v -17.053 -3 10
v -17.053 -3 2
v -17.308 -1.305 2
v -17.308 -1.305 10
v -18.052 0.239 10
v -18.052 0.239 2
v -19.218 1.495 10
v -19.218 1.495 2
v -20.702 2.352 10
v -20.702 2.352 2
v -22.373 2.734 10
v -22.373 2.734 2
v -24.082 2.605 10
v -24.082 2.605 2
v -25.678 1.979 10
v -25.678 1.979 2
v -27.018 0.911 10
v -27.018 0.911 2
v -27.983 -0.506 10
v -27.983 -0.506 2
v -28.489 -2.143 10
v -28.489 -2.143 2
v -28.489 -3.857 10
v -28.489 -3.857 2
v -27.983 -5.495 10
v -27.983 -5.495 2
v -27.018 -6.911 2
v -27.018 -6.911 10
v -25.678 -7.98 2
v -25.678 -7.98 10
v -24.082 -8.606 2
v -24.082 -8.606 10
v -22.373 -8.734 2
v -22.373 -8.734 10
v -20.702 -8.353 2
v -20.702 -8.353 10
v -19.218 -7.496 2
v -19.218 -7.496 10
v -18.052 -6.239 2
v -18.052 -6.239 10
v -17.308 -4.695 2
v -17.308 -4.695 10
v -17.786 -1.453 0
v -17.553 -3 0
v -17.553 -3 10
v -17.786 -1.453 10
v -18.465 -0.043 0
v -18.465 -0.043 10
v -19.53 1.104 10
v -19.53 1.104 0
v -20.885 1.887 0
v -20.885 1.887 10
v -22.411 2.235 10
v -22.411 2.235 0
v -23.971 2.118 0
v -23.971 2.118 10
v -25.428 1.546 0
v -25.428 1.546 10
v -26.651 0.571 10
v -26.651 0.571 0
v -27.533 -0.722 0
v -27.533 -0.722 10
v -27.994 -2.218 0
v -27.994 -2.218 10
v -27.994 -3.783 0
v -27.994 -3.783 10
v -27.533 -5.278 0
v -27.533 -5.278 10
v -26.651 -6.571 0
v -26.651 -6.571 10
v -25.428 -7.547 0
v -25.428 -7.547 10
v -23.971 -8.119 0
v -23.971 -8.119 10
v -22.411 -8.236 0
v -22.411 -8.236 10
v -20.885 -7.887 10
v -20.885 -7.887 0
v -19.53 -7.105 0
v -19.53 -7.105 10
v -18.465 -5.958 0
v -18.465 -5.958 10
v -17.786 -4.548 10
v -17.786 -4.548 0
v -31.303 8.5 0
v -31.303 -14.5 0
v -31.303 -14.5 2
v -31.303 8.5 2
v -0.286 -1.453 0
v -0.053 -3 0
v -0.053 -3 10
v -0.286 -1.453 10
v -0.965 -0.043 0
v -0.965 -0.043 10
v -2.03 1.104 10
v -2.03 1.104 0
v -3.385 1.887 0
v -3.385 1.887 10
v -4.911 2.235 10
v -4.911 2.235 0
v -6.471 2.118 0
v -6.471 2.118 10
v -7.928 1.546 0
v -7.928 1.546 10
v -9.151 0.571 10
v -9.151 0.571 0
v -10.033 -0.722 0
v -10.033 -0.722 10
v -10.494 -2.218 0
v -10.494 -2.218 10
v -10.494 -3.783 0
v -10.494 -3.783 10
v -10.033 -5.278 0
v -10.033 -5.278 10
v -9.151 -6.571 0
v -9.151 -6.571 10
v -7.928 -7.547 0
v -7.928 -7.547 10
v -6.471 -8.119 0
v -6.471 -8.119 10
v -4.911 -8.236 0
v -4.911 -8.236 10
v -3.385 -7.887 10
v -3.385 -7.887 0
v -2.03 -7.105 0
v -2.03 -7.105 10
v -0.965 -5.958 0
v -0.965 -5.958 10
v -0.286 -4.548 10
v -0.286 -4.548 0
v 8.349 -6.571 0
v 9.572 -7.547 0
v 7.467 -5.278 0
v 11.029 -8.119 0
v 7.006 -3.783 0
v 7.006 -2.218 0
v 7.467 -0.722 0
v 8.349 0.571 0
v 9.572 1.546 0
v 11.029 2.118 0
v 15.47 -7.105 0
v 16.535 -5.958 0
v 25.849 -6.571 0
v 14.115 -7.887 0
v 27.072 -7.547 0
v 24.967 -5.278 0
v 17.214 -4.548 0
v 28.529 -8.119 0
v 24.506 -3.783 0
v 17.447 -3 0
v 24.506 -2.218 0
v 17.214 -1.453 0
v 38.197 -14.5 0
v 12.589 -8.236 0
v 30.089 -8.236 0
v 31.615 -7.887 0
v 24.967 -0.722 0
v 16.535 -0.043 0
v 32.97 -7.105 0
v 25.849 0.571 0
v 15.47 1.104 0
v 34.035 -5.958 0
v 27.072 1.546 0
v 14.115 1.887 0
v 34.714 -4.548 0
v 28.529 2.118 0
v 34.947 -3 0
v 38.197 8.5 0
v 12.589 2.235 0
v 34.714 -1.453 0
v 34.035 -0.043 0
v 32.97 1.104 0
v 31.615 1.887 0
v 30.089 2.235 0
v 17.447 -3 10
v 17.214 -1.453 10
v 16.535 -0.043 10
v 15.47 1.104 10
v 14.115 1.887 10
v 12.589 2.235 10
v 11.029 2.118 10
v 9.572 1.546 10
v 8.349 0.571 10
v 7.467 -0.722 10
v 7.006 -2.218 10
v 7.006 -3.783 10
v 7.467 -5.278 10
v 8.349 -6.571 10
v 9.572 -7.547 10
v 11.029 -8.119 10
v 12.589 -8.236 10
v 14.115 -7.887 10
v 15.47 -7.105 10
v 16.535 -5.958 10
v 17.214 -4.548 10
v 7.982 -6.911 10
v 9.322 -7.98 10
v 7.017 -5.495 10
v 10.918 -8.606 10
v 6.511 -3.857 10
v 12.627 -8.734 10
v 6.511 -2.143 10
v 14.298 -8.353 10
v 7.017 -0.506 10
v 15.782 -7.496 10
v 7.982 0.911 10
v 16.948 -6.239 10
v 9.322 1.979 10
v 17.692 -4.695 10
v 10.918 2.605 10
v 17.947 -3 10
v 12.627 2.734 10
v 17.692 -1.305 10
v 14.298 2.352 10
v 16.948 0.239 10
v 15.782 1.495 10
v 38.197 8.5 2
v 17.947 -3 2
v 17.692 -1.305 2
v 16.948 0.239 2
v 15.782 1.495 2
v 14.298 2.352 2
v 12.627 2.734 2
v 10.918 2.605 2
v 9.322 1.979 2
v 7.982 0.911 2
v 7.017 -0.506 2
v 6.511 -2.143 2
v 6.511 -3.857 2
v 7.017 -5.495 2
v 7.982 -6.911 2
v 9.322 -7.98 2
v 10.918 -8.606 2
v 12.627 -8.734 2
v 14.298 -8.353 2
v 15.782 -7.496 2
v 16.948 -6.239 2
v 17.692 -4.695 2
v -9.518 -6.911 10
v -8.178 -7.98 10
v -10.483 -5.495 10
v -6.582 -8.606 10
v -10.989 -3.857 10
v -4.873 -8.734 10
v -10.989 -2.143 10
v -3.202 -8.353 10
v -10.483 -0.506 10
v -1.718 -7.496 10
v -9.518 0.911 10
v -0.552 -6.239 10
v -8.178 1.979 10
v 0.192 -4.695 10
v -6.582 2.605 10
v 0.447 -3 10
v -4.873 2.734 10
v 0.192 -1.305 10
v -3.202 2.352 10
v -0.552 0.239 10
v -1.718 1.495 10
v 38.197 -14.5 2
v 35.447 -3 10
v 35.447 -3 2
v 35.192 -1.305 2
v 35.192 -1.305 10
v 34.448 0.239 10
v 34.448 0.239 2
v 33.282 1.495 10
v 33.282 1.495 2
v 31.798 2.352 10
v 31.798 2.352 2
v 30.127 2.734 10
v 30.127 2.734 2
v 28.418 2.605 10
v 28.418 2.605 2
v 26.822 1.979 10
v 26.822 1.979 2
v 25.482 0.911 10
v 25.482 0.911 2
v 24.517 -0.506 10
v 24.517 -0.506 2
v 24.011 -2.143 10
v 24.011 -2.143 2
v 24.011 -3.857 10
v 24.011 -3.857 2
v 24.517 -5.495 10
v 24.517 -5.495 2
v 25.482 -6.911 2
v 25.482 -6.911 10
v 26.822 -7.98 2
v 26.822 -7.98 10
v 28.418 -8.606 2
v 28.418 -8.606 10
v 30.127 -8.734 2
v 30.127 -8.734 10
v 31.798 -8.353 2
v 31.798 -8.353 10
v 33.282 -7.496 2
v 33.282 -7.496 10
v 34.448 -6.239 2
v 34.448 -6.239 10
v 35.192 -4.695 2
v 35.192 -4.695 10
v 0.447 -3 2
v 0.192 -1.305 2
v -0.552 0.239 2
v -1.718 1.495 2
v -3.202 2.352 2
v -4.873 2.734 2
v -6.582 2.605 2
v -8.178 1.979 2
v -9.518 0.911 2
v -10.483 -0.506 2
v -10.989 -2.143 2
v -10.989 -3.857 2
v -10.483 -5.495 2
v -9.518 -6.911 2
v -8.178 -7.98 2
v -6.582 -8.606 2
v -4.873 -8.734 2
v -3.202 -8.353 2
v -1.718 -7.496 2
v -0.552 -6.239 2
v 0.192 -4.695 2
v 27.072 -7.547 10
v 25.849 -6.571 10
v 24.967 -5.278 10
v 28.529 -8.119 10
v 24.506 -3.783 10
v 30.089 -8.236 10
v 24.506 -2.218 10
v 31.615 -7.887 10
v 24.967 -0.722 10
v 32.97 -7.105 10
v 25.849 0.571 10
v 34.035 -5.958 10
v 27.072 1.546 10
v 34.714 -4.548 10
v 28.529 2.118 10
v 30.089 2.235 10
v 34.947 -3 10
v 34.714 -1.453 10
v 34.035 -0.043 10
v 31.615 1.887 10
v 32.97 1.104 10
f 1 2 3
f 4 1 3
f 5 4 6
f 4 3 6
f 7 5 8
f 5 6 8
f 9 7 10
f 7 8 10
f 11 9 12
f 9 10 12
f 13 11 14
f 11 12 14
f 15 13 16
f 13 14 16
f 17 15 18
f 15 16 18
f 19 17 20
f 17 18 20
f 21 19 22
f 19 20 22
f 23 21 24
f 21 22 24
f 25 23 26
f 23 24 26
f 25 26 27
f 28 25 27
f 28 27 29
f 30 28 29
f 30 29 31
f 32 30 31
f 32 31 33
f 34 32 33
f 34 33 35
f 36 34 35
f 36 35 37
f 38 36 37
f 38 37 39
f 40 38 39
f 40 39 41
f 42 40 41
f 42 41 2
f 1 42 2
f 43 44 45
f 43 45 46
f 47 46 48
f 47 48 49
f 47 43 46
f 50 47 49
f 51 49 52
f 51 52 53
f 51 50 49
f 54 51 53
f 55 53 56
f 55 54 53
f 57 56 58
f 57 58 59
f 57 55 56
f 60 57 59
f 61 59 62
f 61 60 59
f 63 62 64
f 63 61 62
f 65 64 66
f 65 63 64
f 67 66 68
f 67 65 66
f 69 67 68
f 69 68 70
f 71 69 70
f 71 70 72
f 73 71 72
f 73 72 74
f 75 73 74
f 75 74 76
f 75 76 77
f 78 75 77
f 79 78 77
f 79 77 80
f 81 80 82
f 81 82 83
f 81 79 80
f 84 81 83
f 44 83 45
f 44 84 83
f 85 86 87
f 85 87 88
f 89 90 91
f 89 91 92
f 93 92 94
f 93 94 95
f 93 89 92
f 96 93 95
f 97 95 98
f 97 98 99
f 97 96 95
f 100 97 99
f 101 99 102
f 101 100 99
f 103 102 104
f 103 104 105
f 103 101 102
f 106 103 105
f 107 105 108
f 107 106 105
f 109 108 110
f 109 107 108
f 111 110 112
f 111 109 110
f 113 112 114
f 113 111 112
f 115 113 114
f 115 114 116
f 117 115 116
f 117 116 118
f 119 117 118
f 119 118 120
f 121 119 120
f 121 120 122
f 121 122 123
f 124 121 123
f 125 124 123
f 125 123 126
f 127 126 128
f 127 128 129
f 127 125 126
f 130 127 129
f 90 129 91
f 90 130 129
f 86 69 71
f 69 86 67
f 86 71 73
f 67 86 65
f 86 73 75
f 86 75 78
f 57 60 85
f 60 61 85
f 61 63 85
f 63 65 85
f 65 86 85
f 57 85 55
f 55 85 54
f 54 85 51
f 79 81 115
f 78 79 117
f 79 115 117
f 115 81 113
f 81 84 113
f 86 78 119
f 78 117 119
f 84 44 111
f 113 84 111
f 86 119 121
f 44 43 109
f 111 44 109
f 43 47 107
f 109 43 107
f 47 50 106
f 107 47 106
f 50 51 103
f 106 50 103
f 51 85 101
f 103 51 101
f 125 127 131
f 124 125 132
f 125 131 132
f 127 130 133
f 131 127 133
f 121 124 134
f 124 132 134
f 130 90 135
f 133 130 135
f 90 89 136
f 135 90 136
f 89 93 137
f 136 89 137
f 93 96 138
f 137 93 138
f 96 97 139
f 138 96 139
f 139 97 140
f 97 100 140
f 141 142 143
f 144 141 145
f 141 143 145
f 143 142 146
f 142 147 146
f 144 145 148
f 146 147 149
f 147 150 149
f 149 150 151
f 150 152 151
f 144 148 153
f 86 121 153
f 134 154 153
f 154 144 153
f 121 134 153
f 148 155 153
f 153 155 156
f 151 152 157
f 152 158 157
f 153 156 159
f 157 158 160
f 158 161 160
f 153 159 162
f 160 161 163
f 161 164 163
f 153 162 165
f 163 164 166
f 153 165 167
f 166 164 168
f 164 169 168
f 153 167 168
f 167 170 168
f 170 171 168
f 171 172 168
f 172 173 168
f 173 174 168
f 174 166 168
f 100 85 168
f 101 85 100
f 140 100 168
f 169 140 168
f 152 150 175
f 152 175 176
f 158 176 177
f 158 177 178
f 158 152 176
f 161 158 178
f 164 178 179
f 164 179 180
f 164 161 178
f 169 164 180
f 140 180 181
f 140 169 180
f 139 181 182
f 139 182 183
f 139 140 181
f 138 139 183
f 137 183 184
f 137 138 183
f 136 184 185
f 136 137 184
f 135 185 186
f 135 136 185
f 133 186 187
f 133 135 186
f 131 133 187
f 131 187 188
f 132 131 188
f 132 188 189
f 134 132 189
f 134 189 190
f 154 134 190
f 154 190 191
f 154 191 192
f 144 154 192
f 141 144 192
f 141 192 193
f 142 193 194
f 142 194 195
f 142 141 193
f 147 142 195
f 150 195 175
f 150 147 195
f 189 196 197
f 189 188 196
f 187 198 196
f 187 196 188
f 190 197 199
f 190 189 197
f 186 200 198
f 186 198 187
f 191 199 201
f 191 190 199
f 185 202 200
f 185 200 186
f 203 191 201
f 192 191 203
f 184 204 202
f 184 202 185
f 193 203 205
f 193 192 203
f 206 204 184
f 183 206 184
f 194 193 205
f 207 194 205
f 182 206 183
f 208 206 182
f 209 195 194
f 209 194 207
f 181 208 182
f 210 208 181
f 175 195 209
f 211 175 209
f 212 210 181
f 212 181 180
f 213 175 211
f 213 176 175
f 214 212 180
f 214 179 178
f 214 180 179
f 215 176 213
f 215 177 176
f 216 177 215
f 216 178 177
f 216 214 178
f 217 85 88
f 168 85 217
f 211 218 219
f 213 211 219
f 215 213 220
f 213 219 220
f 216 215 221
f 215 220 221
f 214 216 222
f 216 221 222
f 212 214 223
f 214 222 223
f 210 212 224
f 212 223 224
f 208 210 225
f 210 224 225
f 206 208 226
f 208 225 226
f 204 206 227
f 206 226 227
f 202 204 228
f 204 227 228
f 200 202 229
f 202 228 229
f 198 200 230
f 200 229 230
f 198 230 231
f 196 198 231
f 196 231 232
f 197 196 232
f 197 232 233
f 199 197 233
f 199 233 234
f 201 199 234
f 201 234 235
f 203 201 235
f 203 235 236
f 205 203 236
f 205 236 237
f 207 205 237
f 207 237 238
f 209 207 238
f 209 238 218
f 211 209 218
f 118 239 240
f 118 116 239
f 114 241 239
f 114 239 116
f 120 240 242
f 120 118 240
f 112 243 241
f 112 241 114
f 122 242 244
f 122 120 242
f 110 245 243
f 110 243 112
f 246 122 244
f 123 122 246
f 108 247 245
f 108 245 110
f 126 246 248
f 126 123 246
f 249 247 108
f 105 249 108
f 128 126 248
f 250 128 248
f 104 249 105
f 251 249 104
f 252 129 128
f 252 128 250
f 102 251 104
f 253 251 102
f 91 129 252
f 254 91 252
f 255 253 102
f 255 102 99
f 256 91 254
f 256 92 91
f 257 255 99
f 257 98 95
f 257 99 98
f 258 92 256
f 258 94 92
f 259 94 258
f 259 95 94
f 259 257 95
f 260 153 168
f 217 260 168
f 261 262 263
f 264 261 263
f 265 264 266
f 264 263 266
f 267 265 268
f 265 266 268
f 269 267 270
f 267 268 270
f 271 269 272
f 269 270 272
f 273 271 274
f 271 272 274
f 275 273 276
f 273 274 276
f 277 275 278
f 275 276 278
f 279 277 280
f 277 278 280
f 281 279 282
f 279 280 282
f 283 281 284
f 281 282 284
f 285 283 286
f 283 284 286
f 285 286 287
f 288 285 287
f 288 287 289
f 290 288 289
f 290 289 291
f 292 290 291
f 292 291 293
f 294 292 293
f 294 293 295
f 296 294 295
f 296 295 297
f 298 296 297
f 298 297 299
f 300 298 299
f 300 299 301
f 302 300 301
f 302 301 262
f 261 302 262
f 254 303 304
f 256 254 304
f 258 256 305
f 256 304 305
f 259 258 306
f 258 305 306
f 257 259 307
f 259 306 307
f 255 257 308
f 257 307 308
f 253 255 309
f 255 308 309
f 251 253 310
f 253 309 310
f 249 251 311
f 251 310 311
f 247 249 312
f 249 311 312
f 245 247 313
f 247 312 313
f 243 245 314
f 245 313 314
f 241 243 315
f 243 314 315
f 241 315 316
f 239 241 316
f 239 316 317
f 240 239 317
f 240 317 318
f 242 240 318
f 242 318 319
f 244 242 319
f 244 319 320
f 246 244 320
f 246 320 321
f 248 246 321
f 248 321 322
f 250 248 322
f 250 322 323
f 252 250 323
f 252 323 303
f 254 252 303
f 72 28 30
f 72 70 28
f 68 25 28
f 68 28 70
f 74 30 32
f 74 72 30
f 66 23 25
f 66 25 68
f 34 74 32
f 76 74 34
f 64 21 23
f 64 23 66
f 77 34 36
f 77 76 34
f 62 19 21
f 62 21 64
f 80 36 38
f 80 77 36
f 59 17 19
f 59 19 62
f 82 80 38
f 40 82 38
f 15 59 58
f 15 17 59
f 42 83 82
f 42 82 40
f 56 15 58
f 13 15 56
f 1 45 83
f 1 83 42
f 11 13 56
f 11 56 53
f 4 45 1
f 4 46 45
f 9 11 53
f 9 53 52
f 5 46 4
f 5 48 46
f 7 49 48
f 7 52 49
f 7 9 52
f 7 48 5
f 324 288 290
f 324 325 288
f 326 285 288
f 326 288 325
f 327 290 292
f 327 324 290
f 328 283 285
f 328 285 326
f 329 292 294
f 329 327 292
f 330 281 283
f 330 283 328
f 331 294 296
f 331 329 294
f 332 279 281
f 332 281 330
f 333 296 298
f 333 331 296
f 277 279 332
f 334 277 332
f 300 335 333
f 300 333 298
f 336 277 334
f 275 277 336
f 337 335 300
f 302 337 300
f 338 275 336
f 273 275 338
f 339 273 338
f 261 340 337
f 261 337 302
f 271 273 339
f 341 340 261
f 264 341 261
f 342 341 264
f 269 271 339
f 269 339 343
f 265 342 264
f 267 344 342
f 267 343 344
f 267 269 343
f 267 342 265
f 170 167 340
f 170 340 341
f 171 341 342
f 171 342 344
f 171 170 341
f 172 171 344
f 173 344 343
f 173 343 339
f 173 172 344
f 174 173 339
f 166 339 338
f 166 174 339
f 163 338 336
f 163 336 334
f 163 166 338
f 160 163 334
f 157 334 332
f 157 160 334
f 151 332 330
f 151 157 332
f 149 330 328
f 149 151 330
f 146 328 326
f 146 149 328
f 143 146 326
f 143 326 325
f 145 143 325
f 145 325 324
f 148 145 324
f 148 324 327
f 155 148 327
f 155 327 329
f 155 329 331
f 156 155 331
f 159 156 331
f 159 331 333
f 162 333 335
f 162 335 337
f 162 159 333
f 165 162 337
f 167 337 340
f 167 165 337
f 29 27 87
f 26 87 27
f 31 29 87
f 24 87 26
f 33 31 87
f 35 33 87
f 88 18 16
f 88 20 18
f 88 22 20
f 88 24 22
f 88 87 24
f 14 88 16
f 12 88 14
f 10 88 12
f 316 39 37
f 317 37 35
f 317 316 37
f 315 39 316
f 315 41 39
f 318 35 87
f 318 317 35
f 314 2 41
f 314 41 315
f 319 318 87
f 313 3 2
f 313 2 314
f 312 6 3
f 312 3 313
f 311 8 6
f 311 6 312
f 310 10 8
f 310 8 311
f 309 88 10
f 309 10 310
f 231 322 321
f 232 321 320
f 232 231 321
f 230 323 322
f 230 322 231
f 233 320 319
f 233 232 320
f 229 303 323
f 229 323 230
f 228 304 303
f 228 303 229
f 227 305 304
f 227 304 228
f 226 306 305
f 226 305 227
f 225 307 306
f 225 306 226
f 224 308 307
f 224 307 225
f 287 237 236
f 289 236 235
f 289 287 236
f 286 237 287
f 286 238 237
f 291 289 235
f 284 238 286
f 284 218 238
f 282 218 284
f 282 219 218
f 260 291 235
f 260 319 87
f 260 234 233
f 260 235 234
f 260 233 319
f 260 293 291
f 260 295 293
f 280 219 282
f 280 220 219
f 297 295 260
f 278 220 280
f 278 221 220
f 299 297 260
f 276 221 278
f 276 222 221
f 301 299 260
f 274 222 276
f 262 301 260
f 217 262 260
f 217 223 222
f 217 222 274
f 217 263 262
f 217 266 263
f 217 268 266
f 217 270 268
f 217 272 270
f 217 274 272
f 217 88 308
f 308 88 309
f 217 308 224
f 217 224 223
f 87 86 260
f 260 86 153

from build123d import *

# Parameters (mm, degrees)
F0_W     = 69.5
F0_H     = 23
F0_R     = 5.75
F0_W_2   = 1
F0_H_2   = 4
F1_DEPTH = 2
F0_R_2   = 5.25
F2_DEPTH = 10


with BuildPart() as f1:
    # F0 (on Top) → F1 (new body)
    with BuildSketch(Plane.XY):
        with Locations((3.4471642077, -3.0003356891)):
            Rectangle(F0_W, F0_H)
        Polygon((-29.8028357923, -13.0003356891), (-29.8028357923, 6.9996643109), (-15.8028357923, 6.9996643109), (-14.8028357923, 6.9996643109), (-13.3028357923, 6.9996643109), (-12.3028357923, 6.9996643109), (1.6971642077, 6.9996643109), (2.6971642077, 6.9996643109), (4.1971642077, 6.9996643109), (5.1971642077, 6.9996643109), (19.1971642077, 6.9996643109), (20.1971642077, 6.9996643109), (21.6971642077, 6.9996643109), (22.6971642077, 6.9996643109), (36.6971642077, 6.9996643109), (36.6971642077, -13.0003356891), (22.6971642077, -13.0003356891), (21.6971642077, -13.0003356891), (20.1971642077, -13.0003356891), (19.1971642077, -13.0003356891), (5.1971642077, -13.0003356891), (5.1971642077, -9.0003356891), (4.1971642077, -9.0003356891), (4.1971642077, -13.0003356891), (2.6971642077, -13.0003356891), (1.6971642077, -13.0003356891), (-12.3028357923, -13.0003356891), (-13.3028357923, -13.0003356891), (-14.8028357923, -13.0003356891), (-15.8028357923, -13.0003356891), align=None, mode=Mode.SUBTRACT)
        Polygon((-15.8028357923, 6.9996643109), (-29.8028357923, 6.9996643109), (-29.8028357923, -13.0003356891), (-15.8028357923, -13.0003356891), (-15.8028357923, -9.0003356891), (-14.8028357923, -9.0003356891), (-14.8028357923, -13.0003356891), (-13.3028357923, -13.0003356891), (-13.3028357923, -9.0003356891), (-12.3028357923, -9.0003356891), (-12.3028357923, -13.0003356891), (1.6971642077, -13.0003356891), (1.6971642077, -9.0003356891), (2.6971642077, -9.0003356891), (2.6971642077, -13.0003356891), (4.1971642077, -13.0003356891), (4.1971642077, -9.0003356891), (5.1971642077, -9.0003356891), (5.1971642077, -13.0003356891), (19.1971642077, -13.0003356891), (19.1971642077, -9.0003356891), (20.1971642077, -9.0003356891), (20.1971642077, -13.0003356891), (21.6971642077, -13.0003356891), (21.6971642077, -9.0003356891), (22.6971642077, -9.0003356891), (22.6971642077, -13.0003356891), (36.6971642077, -13.0003356891), (36.6971642077, 6.9996643109), (22.6971642077, 6.9996643109), (22.6971642077, 2.9996643109), (21.6971642077, 2.9996643109), (21.6971642077, 6.9996643109), (20.1971642077, 6.9996643109), (20.1971642077, 2.9996643109), (19.1971642077, 2.9996643109), (19.1971642077, 6.9996643109), (5.1971642077, 6.9996643109), (5.1971642077, 2.9996643109), (4.1971642077, 2.9996643109), (4.1971642077, 6.9996643109), (2.6971642077, 6.9996643109), (2.6971642077, 2.9996643109), (1.6971642077, 2.9996643109), (1.6971642077, 6.9996643109), (-12.3028357923, 6.9996643109), (-12.3028357923, 2.9996643109), (-13.3028357923, 2.9996643109), (-13.3028357923, 6.9996643109), (-14.8028357923, 6.9996643109), (-14.8028357923, 2.9996643109), (-15.8028357923, 2.9996643109), align=None)
        with Locations((-22.8028357923, -3.0003356891)):
            Circle(F0_R, mode=Mode.SUBTRACT)
        with Locations((-5.3028357923, -3.0003356891)):
            Circle(F0_R, mode=Mode.SUBTRACT)
        with Locations((12.1971642077, -3.0003356891)):
            Circle(F0_R, mode=Mode.SUBTRACT)
        with Locations((29.6971642077, -3.0003356891)):
            Circle(F0_R, mode=Mode.SUBTRACT)
        with Locations((-15.3028357923, 4.9996643109)):
            Rectangle(F0_W_2, F0_H_2)
        with Locations((-12.8028357923, 4.9996643109)):
            Rectangle(F0_W_2, F0_H_2)
        with Locations((2.1971642077, 4.9996643109)):
            Rectangle(F0_W_2, F0_H_2)
        with Locations((4.6971642077, 4.9996643109)):
            Rectangle(F0_W_2, F0_H_2)
        with Locations((19.6971642077, 4.9996643109)):
            Rectangle(F0_W_2, F0_H_2)
        with Locations((22.1971642077, 4.9996643109)):
            Rectangle(F0_W_2, F0_H_2)
        with Locations((-15.3028357923, -11.0003356891)):
            Rectangle(F0_W_2, F0_H_2)
        with Locations((-12.8028357923, -11.0003356891)):
            Rectangle(F0_W_2, F0_H_2)
        with Locations((2.1971642077, -11.0003356891)):
            Rectangle(F0_W_2, F0_H_2)
        with Locations((19.6971642077, -11.0003356891)):
            Rectangle(F0_W_2, F0_H_2)
        with Locations((22.1971642077, -11.0003356891)):
            Rectangle(F0_W_2, F0_H_2)
    extrude(amount=F1_DEPTH)

    # F0 (on Top) → F2 (join)
    with BuildSketch(Plane.XY):
        with Locations((-22.8028357923, -3.0003356891)):
            Circle(F0_R)
        with Locations((-22.8028357923, -3.0003356891)):
            Circle(F0_R_2, mode=Mode.SUBTRACT)
        with Locations((-5.3028357923, -3.0003356891)):
            Circle(F0_R)
        with Locations((-5.3028357923, -3.0003356891)):
            Circle(F0_R_2, mode=Mode.SUBTRACT)
        with Locations((12.1971642077, -3.0003356891)):
            Circle(F0_R)
        with Locations((12.1971642077, -3.0003356891)):
            Circle(F0_R_2, mode=Mode.SUBTRACT)
        with Locations((29.6971642077, -3.0003356891)):
            Circle(F0_R)
        with Locations((29.6971642077, -3.0003356891)):
            Circle(F0_R_2, mode=Mode.SUBTRACT)
    extrude(amount=F2_DEPTH)


solid = f1.part
